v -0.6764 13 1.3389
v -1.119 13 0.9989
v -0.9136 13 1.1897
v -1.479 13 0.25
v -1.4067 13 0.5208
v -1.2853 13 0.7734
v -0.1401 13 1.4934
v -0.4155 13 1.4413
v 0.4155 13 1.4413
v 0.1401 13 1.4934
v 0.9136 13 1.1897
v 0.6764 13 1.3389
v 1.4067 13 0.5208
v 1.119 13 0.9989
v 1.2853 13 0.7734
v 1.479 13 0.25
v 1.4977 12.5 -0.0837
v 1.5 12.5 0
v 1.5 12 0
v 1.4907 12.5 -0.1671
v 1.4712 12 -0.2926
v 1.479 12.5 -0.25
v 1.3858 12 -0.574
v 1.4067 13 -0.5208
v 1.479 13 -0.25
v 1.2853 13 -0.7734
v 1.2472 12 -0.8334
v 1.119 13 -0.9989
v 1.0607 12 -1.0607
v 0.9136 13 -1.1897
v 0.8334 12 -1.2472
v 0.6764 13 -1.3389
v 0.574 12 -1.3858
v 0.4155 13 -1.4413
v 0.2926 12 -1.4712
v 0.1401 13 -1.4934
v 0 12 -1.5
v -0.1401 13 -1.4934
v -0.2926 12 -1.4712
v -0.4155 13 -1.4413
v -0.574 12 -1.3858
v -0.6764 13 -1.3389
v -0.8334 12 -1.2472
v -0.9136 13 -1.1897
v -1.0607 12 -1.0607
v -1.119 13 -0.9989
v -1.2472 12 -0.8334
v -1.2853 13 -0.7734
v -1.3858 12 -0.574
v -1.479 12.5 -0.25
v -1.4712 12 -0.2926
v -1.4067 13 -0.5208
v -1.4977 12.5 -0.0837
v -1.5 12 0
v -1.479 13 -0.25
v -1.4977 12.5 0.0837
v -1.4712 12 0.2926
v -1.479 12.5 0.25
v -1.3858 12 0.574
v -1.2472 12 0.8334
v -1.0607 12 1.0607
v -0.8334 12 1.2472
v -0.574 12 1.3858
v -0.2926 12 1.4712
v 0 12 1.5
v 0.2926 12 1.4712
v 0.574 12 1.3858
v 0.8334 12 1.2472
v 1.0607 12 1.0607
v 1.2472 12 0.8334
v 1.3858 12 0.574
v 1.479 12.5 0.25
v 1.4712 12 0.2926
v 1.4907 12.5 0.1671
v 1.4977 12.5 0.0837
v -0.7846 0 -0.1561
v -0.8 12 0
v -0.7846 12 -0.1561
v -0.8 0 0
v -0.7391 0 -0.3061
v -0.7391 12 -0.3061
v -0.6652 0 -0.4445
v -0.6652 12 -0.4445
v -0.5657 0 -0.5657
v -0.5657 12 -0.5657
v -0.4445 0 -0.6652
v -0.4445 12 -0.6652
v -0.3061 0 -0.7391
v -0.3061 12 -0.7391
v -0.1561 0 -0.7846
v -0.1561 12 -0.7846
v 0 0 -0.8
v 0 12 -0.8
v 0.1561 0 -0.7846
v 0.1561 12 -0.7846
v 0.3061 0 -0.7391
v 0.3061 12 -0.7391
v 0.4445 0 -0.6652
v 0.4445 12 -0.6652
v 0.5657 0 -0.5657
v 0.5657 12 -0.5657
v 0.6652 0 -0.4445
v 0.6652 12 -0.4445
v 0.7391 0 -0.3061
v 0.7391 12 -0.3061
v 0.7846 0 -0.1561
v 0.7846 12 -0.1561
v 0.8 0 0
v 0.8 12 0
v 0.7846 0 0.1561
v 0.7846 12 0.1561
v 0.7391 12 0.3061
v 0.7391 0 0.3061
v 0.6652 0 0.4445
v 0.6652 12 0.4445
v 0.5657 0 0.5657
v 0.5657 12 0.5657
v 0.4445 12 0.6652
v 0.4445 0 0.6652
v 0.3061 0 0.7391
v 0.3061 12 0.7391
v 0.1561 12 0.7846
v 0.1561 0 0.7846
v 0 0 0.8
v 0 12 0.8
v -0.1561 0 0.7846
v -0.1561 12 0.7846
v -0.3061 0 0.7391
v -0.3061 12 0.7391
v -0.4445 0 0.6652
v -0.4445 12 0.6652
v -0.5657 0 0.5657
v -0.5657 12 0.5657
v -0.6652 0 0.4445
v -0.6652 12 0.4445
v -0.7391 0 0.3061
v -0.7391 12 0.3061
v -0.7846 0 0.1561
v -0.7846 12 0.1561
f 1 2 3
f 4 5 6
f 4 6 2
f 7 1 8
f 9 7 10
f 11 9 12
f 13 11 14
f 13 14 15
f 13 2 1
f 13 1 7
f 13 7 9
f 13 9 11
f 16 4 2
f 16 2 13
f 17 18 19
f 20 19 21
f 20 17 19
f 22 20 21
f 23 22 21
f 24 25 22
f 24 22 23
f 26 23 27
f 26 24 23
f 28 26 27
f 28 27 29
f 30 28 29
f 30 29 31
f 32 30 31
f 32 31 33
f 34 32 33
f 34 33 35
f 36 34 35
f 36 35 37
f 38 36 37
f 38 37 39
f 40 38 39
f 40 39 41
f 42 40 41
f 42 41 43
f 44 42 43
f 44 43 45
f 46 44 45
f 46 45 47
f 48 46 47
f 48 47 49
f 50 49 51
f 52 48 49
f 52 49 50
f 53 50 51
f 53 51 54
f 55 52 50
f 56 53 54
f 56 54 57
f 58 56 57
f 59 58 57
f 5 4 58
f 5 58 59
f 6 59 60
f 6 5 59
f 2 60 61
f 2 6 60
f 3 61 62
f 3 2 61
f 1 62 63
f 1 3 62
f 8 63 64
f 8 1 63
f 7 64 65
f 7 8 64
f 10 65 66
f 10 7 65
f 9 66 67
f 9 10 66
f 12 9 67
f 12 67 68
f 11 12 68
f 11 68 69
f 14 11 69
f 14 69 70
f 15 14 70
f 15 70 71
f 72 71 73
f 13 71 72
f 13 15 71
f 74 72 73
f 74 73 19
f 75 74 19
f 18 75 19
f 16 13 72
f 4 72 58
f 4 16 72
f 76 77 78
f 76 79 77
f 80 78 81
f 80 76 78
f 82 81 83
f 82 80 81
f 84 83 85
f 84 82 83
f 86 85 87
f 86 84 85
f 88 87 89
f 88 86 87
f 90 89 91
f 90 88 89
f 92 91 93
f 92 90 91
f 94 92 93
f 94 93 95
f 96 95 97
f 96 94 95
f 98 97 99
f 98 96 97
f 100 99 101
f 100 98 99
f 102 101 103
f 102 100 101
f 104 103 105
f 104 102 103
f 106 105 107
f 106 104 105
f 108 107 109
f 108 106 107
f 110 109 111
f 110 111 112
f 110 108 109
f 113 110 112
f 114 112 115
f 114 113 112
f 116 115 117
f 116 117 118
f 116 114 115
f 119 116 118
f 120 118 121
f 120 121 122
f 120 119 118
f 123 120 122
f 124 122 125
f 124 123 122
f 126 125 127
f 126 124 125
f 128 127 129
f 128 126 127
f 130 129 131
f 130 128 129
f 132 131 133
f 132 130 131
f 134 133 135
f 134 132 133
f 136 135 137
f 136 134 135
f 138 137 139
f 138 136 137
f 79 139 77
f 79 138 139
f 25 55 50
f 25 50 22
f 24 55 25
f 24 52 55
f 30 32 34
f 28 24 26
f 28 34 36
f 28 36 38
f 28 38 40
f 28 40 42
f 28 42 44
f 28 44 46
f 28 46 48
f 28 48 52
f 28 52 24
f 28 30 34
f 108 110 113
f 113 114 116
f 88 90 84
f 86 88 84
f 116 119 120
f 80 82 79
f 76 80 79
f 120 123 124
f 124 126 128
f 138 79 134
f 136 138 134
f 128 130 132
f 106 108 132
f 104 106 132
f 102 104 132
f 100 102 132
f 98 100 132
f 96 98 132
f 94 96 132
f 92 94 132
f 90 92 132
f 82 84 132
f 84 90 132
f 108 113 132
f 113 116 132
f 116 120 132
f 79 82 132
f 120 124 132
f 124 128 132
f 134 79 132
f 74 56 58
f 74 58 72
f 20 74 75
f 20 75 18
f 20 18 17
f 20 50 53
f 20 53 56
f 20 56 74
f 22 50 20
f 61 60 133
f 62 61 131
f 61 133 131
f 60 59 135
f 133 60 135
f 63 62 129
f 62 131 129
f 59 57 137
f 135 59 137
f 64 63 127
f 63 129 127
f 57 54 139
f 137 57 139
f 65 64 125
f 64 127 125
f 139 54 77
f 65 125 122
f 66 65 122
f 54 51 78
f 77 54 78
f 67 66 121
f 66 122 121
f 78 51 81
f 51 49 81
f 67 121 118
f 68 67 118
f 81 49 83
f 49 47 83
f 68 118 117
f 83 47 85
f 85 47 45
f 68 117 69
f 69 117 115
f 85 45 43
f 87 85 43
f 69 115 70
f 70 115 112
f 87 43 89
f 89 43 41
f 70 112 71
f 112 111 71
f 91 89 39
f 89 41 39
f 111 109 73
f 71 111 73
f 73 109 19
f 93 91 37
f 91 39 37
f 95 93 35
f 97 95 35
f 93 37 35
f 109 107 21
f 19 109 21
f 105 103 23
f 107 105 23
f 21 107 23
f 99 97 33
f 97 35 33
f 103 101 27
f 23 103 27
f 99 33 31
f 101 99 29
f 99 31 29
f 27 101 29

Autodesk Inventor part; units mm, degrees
ref_plane "YZ Plane" through (0, 0, 0) normal (1, 0, 0) x (0, 1, 0)
ref_plane "XZ Plane" through (0, 0, 0) normal (0, 1, 0) x (-1, 0, 0)
ref_plane "XY Plane" through (0, 0, 0) normal (0, 0, 1) x (1, 0, 0)
sketch "Sketch1" plane through (0, 0, 0) normal (0, 1, 0) x (-1, 0, 0)
  circle A0 centre (0, 0) radius 0.8
  dimension "d0" = 1.6
extrude "Extrusion1" add sketch "Sketch1" along normal blind 13
sketch "Sketch2" plane through (0, 13, 0) normal (0, 1, 0) x (1, 0, 0)
  circle A0 centre (0, 0) radius 0.8 projected
  circle A1 centre (0, 0) radius 1.5
  dimension "d3" = 3
extrude "Extrusion2" add sketch "Sketch2" against normal blind 1
sketch "Sketch3" plane through (0, 13, 0) normal (0, 1, 0) x (1, 0, 0)
  line L0 (2, -0.25) -> (-2, -0.25)
  line L1 (-2, -0.25) -> (-2, 0.25)
  line L2 (-2, 0.25) -> (2, 0.25)
  line L3 (2, 0.25) -> (2, -0.25)
  line L4 (2, -0.25) -> (-2, 0.25) construction
  line L5 (-2, -0.25) -> (2, 0.25) construction
  point P0 (0, 0)
  dimension "d6" = 0.5
  dimension "d7" = 4
extrude "Extrusion3" cut sketch "Sketch3" against normal blind 0.5
properties part number "M1.6x0.35 Bolt" material "Aluminum 6061"
